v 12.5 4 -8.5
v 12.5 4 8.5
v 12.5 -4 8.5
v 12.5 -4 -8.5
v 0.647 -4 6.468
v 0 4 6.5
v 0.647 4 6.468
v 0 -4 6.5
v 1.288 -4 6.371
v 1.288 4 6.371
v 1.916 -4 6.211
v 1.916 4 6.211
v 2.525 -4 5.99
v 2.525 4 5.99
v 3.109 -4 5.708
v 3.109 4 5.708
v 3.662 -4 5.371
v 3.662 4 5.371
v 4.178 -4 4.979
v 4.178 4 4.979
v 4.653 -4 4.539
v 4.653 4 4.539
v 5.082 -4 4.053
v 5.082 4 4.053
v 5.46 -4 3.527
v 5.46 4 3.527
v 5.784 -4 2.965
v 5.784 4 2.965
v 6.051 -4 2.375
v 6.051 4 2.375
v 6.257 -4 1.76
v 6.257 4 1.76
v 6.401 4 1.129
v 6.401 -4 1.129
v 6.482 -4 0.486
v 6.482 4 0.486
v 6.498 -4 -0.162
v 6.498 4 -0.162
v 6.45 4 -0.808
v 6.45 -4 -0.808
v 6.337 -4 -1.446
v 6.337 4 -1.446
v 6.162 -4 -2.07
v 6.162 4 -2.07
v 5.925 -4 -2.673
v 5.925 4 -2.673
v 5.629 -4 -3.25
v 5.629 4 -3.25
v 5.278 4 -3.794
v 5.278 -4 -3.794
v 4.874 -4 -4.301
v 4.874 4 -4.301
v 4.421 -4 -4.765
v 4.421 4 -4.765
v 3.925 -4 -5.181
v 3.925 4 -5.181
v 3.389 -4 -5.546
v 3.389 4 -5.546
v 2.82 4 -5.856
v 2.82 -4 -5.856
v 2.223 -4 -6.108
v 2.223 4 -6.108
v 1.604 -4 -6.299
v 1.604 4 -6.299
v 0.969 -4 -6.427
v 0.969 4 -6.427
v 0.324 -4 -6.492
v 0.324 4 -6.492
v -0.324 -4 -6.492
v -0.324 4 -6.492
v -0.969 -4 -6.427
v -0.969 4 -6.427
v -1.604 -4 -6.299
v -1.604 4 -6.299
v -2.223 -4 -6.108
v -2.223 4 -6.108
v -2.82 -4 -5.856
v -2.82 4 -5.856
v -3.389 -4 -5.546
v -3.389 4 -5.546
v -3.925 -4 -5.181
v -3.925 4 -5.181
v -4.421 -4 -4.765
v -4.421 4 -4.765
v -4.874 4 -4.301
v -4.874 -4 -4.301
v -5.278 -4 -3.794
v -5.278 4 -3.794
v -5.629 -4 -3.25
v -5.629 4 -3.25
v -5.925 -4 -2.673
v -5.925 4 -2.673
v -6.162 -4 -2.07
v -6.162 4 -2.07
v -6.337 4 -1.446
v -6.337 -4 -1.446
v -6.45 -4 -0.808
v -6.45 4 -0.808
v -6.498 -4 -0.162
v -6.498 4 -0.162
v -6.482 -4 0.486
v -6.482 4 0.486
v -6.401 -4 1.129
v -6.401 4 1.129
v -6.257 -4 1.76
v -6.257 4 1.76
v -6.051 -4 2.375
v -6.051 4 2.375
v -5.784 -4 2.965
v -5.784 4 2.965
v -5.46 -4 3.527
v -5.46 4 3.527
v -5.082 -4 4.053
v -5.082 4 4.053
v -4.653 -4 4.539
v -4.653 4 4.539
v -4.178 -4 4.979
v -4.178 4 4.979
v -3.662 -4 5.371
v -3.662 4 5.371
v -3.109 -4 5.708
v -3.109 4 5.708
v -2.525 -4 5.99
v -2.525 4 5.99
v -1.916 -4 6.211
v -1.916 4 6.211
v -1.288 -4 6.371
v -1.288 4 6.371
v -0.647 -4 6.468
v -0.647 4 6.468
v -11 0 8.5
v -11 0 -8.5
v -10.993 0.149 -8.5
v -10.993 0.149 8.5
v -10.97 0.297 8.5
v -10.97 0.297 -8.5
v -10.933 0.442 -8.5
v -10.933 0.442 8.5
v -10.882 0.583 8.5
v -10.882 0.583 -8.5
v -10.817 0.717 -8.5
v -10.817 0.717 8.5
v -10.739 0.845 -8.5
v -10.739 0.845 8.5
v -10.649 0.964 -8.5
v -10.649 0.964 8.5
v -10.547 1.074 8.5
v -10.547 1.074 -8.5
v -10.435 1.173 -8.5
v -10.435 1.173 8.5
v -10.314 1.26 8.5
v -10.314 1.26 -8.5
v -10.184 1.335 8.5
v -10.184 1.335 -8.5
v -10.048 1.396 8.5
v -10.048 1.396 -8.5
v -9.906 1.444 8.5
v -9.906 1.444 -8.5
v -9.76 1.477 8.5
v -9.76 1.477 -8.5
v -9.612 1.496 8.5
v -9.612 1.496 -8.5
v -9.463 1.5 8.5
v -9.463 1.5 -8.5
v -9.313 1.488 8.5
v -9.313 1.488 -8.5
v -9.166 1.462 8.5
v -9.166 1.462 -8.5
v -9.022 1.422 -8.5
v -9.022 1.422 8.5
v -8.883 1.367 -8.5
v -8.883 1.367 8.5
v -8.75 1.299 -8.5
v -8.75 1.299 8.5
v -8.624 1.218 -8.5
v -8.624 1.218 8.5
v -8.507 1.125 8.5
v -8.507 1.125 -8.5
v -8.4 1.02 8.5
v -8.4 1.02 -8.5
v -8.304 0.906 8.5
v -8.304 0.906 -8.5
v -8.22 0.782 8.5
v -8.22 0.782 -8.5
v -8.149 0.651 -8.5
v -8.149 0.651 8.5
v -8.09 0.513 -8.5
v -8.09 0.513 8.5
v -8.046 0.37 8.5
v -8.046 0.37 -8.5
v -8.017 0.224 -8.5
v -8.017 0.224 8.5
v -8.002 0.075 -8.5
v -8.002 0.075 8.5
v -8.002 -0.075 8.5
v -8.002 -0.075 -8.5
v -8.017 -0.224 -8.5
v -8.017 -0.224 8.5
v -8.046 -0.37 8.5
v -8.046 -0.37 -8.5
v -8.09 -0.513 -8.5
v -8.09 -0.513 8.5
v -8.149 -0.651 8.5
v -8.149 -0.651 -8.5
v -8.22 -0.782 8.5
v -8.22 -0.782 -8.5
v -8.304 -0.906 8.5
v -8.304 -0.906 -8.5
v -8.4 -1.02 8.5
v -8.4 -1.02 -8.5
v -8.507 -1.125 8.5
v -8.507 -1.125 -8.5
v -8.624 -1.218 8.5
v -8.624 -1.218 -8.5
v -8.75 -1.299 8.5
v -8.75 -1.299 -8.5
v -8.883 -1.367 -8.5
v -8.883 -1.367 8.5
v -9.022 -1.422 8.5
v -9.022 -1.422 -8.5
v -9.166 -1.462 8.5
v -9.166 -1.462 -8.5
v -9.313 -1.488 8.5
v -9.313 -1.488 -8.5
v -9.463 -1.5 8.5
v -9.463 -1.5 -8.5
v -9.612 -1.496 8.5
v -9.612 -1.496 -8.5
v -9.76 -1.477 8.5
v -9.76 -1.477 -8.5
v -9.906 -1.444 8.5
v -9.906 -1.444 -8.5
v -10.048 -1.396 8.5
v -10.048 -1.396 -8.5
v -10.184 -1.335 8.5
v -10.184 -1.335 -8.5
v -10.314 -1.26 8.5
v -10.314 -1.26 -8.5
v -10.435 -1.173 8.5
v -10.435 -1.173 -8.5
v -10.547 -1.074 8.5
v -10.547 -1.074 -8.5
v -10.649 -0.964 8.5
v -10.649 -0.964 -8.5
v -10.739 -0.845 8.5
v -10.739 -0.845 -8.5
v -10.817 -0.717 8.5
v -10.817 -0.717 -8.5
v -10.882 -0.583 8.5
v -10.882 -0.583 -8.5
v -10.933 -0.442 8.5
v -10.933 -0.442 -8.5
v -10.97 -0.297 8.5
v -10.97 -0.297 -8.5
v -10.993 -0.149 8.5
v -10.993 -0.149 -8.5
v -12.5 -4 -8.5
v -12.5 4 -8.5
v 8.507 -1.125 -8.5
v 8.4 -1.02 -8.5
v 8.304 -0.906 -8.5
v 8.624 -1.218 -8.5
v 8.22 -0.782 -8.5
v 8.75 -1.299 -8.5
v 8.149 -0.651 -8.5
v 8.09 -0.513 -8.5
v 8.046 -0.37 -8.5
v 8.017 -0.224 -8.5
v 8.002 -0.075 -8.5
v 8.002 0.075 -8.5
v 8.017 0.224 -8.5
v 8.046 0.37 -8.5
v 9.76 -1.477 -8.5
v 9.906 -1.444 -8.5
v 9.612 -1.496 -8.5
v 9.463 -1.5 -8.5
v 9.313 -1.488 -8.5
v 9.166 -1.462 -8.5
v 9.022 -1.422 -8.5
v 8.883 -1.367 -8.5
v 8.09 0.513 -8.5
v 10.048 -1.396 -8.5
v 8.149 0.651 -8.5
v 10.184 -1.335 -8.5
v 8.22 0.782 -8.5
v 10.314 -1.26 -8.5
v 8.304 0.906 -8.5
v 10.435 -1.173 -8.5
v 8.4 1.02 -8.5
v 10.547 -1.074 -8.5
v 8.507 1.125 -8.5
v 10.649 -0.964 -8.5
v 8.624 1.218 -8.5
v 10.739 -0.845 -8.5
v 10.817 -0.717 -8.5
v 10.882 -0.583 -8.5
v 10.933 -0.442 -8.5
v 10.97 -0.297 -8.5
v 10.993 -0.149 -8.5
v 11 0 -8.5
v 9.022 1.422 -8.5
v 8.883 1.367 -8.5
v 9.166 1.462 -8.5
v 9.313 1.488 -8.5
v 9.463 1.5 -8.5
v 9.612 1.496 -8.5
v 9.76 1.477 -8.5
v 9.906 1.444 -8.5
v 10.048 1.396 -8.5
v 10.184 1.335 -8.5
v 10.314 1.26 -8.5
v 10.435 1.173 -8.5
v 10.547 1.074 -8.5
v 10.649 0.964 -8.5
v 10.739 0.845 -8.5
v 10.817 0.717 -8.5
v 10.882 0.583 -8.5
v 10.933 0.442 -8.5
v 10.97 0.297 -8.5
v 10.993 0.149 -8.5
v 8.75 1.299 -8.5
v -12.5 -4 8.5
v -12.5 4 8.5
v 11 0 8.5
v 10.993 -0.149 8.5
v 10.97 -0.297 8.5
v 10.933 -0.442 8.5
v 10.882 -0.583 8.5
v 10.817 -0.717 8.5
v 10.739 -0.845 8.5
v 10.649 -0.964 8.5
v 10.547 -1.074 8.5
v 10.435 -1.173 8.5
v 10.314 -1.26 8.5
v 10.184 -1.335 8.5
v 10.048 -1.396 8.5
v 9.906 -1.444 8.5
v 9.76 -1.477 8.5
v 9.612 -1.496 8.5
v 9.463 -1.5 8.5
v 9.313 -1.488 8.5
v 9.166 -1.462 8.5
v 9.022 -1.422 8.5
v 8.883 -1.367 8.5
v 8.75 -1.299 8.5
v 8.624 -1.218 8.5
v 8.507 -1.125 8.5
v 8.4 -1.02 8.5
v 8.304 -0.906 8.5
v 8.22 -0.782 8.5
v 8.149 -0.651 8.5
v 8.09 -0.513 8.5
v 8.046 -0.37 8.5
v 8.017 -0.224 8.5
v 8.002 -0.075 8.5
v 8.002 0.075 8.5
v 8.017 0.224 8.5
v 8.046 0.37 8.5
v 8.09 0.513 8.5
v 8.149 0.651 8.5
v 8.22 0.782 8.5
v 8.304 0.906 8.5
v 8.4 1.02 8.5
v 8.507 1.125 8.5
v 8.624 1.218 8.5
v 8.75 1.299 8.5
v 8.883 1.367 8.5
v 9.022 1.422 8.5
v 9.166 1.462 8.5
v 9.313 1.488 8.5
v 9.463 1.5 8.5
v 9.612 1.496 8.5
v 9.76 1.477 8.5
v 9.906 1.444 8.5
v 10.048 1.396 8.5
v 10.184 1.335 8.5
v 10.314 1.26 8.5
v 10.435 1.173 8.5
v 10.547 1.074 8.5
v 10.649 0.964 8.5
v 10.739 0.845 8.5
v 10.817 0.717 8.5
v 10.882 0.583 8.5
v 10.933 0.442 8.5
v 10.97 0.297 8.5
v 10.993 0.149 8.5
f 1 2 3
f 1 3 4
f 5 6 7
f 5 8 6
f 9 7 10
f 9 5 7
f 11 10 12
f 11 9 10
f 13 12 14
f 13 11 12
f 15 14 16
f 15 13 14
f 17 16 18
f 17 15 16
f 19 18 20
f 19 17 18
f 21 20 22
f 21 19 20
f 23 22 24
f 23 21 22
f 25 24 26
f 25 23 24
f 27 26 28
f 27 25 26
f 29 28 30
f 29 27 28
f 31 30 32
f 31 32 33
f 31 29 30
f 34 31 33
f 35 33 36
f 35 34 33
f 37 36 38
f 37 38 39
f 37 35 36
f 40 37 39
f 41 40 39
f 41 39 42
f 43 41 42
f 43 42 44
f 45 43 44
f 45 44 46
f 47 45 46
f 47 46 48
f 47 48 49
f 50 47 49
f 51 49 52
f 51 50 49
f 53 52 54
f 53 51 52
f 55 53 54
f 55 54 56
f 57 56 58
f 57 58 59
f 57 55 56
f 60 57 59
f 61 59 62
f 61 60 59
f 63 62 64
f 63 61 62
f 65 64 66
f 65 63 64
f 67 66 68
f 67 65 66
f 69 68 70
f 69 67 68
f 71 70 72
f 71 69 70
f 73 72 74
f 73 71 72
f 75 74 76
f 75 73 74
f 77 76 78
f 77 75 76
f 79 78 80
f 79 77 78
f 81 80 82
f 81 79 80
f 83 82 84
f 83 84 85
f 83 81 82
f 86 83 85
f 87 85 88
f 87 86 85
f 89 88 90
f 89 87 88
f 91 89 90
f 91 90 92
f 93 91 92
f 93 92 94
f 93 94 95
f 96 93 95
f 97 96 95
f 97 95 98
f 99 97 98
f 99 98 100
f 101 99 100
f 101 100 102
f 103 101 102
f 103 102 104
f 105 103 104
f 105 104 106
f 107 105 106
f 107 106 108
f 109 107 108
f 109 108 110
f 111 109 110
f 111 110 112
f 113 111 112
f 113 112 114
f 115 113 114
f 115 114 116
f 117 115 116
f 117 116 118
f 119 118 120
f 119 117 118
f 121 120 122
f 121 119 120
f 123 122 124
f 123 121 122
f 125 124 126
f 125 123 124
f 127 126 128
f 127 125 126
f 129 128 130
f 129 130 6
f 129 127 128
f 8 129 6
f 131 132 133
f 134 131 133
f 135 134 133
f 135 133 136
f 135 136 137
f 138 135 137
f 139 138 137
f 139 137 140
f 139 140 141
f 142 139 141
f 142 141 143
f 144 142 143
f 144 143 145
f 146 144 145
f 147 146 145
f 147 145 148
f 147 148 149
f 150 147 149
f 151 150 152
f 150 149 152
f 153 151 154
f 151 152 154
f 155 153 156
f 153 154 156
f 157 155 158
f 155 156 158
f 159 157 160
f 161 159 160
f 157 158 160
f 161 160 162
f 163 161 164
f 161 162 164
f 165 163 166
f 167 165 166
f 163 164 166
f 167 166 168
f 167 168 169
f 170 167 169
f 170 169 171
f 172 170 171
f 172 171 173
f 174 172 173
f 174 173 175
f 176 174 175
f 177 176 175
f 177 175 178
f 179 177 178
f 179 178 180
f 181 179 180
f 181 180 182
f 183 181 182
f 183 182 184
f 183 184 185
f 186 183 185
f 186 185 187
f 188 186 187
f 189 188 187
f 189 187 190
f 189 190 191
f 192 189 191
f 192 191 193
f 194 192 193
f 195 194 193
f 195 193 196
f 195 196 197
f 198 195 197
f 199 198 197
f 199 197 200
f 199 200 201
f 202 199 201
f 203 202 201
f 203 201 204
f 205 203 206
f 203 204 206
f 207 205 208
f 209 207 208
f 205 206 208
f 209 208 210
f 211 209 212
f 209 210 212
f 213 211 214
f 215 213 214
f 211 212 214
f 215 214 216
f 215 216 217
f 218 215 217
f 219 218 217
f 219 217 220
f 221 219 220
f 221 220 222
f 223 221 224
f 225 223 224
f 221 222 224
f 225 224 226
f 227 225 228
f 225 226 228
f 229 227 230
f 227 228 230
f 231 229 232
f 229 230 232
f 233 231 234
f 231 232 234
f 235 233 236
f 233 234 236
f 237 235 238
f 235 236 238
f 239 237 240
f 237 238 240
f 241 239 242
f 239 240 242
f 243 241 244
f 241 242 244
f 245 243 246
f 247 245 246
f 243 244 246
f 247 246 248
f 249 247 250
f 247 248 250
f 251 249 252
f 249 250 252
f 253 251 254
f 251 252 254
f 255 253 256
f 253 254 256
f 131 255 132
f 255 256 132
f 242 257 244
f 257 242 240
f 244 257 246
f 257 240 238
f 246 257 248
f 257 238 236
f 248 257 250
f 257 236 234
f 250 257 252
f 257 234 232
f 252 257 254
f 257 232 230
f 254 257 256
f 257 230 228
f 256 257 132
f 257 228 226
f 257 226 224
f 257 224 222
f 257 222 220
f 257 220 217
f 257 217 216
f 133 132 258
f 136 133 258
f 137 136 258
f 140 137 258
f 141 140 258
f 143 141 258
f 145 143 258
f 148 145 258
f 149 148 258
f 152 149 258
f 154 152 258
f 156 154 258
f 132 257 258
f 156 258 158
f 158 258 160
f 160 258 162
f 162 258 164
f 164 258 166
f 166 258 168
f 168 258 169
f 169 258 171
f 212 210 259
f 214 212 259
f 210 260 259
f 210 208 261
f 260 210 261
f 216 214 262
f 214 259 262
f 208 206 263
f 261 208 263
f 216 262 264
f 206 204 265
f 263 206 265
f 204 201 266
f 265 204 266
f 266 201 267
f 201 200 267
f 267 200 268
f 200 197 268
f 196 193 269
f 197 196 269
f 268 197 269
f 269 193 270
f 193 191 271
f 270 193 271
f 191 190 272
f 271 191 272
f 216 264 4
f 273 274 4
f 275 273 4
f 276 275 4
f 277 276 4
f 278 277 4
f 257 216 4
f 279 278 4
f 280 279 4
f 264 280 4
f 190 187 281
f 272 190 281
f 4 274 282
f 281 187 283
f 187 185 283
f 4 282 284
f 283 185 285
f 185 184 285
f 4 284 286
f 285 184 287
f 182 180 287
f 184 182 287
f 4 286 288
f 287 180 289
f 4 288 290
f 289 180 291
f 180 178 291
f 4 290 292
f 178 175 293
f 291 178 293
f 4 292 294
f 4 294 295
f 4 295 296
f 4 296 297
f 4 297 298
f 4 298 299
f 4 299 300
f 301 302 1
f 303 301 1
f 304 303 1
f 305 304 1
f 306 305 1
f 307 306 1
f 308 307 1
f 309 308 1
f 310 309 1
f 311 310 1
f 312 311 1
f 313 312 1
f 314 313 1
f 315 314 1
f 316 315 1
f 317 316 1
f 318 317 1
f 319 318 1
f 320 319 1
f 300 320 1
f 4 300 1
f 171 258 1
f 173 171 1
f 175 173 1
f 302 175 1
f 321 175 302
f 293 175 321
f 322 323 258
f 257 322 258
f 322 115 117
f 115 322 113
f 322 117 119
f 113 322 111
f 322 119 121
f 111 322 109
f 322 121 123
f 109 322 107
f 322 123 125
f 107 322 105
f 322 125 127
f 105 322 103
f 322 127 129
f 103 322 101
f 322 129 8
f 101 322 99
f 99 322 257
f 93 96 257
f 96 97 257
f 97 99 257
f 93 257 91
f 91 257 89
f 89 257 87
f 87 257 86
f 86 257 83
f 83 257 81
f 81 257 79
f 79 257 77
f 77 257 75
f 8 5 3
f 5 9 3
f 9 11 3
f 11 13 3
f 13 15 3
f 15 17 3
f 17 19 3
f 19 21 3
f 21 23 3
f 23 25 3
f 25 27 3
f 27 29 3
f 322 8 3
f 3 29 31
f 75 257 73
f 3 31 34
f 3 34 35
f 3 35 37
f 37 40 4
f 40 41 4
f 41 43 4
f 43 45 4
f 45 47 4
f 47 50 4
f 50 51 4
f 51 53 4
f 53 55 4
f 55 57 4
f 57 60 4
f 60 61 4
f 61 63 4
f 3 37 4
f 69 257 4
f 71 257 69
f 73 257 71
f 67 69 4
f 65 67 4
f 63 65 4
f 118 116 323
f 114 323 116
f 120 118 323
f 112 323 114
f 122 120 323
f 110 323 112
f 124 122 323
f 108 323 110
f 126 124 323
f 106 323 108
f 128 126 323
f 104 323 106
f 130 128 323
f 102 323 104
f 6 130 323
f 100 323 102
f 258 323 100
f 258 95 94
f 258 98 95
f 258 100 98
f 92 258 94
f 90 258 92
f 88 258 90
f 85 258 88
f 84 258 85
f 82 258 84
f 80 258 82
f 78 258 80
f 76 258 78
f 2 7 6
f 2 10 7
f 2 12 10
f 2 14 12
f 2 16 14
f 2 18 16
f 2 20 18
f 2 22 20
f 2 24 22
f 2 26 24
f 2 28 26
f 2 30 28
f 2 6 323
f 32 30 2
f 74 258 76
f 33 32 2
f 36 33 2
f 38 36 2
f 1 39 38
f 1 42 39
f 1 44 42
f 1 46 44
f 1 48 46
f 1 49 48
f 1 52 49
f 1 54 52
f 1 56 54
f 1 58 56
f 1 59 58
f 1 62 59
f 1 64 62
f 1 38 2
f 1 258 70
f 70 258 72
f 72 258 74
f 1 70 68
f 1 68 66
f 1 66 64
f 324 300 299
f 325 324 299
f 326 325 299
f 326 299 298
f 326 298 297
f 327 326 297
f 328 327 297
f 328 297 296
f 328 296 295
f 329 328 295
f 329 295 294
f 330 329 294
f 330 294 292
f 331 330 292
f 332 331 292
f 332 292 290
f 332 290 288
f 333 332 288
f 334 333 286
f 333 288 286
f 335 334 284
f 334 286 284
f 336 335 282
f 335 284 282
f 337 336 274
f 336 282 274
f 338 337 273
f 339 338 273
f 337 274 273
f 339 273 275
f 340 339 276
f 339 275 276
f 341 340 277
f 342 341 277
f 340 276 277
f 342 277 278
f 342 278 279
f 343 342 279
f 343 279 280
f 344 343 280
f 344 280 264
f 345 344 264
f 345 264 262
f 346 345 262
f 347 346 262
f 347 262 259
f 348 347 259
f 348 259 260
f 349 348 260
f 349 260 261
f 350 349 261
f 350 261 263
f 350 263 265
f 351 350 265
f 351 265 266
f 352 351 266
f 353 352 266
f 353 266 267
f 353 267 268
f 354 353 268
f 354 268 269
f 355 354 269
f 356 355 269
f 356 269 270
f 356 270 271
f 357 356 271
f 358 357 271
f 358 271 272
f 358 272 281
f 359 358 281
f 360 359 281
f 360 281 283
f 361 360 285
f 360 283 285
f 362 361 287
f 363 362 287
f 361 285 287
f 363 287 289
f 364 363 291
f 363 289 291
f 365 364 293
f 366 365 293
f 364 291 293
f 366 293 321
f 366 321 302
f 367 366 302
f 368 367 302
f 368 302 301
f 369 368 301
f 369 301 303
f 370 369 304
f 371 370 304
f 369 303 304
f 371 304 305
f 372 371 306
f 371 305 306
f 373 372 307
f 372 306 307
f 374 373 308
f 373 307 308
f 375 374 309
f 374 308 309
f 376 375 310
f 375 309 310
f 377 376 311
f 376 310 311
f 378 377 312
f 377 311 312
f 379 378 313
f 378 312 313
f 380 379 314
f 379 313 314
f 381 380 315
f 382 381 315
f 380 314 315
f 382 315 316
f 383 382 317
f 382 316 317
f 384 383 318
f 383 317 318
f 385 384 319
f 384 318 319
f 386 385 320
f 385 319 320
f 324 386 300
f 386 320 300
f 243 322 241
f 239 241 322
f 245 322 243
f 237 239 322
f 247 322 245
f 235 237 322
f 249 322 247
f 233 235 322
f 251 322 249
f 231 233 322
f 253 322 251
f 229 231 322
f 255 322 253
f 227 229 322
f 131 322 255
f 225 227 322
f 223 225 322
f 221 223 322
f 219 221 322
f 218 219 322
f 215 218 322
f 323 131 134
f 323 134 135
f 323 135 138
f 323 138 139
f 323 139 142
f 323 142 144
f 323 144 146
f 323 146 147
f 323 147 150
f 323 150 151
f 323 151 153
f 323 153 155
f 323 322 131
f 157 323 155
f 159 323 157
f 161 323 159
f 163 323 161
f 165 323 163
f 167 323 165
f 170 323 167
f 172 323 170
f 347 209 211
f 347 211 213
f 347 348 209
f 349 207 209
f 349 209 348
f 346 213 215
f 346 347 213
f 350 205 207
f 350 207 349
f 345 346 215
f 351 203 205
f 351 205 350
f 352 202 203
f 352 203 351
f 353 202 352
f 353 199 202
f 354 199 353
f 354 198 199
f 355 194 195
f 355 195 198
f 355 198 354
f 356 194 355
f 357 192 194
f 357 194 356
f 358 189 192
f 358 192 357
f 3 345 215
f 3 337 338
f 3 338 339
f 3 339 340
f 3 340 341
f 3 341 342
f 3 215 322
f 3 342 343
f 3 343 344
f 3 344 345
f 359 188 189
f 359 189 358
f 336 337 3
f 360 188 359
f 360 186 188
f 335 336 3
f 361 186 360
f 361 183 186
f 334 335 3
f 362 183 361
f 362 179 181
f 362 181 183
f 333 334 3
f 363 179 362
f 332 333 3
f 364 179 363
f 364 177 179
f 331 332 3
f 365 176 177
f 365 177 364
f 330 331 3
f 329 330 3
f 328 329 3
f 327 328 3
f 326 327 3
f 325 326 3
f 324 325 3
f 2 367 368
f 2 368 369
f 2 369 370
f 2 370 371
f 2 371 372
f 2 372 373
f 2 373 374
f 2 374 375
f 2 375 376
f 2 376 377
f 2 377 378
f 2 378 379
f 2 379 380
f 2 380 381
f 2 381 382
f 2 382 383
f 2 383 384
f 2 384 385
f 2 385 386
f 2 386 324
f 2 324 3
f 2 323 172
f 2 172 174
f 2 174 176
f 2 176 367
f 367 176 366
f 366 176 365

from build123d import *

# Parameters (mm, degrees)
SKETCH_1_W          = 25
SKETCH_1_H          = 17
SKETCH_1_R          = 6.5
EXTRUDE_1_DEPTH     = 4
SKETCH_2_R          = 1.5
CUT_EXTRUDE_1_DEPTH = 22.476731595


with BuildPart() as part:
    # 草图1 → 凸台-拉伸1 (new, symmetric)
    with BuildSketch(Plane(origin=(0, 0, 0), x_dir=(1, 0, 0), z_dir=(0, 1, 0))):
        Rectangle(SKETCH_1_W, SKETCH_1_H)
        with Locations(Location((0, 0, 0), (0, 0, 270))):
            Circle(SKETCH_1_R, mode=Mode.SUBTRACT)
    extrude(amount=EXTRUDE_1_DEPTH, both=True)

    # 草图2 → 切除-拉伸1 (cut, through all)
    with BuildSketch(Plane(origin=(0, 0, -8.5), x_dir=(-1, 0, 0), z_dir=(0, 0, -1))):
        with Locations((9.5, 0)):
            Circle(SKETCH_2_R)
        with Locations(Location((-9.5, 0, 0), (0, 0, 180))):
            Circle(SKETCH_2_R)
    extrude(amount=-CUT_EXTRUDE_1_DEPTH, mode=Mode.SUBTRACT)


solid = part.part
